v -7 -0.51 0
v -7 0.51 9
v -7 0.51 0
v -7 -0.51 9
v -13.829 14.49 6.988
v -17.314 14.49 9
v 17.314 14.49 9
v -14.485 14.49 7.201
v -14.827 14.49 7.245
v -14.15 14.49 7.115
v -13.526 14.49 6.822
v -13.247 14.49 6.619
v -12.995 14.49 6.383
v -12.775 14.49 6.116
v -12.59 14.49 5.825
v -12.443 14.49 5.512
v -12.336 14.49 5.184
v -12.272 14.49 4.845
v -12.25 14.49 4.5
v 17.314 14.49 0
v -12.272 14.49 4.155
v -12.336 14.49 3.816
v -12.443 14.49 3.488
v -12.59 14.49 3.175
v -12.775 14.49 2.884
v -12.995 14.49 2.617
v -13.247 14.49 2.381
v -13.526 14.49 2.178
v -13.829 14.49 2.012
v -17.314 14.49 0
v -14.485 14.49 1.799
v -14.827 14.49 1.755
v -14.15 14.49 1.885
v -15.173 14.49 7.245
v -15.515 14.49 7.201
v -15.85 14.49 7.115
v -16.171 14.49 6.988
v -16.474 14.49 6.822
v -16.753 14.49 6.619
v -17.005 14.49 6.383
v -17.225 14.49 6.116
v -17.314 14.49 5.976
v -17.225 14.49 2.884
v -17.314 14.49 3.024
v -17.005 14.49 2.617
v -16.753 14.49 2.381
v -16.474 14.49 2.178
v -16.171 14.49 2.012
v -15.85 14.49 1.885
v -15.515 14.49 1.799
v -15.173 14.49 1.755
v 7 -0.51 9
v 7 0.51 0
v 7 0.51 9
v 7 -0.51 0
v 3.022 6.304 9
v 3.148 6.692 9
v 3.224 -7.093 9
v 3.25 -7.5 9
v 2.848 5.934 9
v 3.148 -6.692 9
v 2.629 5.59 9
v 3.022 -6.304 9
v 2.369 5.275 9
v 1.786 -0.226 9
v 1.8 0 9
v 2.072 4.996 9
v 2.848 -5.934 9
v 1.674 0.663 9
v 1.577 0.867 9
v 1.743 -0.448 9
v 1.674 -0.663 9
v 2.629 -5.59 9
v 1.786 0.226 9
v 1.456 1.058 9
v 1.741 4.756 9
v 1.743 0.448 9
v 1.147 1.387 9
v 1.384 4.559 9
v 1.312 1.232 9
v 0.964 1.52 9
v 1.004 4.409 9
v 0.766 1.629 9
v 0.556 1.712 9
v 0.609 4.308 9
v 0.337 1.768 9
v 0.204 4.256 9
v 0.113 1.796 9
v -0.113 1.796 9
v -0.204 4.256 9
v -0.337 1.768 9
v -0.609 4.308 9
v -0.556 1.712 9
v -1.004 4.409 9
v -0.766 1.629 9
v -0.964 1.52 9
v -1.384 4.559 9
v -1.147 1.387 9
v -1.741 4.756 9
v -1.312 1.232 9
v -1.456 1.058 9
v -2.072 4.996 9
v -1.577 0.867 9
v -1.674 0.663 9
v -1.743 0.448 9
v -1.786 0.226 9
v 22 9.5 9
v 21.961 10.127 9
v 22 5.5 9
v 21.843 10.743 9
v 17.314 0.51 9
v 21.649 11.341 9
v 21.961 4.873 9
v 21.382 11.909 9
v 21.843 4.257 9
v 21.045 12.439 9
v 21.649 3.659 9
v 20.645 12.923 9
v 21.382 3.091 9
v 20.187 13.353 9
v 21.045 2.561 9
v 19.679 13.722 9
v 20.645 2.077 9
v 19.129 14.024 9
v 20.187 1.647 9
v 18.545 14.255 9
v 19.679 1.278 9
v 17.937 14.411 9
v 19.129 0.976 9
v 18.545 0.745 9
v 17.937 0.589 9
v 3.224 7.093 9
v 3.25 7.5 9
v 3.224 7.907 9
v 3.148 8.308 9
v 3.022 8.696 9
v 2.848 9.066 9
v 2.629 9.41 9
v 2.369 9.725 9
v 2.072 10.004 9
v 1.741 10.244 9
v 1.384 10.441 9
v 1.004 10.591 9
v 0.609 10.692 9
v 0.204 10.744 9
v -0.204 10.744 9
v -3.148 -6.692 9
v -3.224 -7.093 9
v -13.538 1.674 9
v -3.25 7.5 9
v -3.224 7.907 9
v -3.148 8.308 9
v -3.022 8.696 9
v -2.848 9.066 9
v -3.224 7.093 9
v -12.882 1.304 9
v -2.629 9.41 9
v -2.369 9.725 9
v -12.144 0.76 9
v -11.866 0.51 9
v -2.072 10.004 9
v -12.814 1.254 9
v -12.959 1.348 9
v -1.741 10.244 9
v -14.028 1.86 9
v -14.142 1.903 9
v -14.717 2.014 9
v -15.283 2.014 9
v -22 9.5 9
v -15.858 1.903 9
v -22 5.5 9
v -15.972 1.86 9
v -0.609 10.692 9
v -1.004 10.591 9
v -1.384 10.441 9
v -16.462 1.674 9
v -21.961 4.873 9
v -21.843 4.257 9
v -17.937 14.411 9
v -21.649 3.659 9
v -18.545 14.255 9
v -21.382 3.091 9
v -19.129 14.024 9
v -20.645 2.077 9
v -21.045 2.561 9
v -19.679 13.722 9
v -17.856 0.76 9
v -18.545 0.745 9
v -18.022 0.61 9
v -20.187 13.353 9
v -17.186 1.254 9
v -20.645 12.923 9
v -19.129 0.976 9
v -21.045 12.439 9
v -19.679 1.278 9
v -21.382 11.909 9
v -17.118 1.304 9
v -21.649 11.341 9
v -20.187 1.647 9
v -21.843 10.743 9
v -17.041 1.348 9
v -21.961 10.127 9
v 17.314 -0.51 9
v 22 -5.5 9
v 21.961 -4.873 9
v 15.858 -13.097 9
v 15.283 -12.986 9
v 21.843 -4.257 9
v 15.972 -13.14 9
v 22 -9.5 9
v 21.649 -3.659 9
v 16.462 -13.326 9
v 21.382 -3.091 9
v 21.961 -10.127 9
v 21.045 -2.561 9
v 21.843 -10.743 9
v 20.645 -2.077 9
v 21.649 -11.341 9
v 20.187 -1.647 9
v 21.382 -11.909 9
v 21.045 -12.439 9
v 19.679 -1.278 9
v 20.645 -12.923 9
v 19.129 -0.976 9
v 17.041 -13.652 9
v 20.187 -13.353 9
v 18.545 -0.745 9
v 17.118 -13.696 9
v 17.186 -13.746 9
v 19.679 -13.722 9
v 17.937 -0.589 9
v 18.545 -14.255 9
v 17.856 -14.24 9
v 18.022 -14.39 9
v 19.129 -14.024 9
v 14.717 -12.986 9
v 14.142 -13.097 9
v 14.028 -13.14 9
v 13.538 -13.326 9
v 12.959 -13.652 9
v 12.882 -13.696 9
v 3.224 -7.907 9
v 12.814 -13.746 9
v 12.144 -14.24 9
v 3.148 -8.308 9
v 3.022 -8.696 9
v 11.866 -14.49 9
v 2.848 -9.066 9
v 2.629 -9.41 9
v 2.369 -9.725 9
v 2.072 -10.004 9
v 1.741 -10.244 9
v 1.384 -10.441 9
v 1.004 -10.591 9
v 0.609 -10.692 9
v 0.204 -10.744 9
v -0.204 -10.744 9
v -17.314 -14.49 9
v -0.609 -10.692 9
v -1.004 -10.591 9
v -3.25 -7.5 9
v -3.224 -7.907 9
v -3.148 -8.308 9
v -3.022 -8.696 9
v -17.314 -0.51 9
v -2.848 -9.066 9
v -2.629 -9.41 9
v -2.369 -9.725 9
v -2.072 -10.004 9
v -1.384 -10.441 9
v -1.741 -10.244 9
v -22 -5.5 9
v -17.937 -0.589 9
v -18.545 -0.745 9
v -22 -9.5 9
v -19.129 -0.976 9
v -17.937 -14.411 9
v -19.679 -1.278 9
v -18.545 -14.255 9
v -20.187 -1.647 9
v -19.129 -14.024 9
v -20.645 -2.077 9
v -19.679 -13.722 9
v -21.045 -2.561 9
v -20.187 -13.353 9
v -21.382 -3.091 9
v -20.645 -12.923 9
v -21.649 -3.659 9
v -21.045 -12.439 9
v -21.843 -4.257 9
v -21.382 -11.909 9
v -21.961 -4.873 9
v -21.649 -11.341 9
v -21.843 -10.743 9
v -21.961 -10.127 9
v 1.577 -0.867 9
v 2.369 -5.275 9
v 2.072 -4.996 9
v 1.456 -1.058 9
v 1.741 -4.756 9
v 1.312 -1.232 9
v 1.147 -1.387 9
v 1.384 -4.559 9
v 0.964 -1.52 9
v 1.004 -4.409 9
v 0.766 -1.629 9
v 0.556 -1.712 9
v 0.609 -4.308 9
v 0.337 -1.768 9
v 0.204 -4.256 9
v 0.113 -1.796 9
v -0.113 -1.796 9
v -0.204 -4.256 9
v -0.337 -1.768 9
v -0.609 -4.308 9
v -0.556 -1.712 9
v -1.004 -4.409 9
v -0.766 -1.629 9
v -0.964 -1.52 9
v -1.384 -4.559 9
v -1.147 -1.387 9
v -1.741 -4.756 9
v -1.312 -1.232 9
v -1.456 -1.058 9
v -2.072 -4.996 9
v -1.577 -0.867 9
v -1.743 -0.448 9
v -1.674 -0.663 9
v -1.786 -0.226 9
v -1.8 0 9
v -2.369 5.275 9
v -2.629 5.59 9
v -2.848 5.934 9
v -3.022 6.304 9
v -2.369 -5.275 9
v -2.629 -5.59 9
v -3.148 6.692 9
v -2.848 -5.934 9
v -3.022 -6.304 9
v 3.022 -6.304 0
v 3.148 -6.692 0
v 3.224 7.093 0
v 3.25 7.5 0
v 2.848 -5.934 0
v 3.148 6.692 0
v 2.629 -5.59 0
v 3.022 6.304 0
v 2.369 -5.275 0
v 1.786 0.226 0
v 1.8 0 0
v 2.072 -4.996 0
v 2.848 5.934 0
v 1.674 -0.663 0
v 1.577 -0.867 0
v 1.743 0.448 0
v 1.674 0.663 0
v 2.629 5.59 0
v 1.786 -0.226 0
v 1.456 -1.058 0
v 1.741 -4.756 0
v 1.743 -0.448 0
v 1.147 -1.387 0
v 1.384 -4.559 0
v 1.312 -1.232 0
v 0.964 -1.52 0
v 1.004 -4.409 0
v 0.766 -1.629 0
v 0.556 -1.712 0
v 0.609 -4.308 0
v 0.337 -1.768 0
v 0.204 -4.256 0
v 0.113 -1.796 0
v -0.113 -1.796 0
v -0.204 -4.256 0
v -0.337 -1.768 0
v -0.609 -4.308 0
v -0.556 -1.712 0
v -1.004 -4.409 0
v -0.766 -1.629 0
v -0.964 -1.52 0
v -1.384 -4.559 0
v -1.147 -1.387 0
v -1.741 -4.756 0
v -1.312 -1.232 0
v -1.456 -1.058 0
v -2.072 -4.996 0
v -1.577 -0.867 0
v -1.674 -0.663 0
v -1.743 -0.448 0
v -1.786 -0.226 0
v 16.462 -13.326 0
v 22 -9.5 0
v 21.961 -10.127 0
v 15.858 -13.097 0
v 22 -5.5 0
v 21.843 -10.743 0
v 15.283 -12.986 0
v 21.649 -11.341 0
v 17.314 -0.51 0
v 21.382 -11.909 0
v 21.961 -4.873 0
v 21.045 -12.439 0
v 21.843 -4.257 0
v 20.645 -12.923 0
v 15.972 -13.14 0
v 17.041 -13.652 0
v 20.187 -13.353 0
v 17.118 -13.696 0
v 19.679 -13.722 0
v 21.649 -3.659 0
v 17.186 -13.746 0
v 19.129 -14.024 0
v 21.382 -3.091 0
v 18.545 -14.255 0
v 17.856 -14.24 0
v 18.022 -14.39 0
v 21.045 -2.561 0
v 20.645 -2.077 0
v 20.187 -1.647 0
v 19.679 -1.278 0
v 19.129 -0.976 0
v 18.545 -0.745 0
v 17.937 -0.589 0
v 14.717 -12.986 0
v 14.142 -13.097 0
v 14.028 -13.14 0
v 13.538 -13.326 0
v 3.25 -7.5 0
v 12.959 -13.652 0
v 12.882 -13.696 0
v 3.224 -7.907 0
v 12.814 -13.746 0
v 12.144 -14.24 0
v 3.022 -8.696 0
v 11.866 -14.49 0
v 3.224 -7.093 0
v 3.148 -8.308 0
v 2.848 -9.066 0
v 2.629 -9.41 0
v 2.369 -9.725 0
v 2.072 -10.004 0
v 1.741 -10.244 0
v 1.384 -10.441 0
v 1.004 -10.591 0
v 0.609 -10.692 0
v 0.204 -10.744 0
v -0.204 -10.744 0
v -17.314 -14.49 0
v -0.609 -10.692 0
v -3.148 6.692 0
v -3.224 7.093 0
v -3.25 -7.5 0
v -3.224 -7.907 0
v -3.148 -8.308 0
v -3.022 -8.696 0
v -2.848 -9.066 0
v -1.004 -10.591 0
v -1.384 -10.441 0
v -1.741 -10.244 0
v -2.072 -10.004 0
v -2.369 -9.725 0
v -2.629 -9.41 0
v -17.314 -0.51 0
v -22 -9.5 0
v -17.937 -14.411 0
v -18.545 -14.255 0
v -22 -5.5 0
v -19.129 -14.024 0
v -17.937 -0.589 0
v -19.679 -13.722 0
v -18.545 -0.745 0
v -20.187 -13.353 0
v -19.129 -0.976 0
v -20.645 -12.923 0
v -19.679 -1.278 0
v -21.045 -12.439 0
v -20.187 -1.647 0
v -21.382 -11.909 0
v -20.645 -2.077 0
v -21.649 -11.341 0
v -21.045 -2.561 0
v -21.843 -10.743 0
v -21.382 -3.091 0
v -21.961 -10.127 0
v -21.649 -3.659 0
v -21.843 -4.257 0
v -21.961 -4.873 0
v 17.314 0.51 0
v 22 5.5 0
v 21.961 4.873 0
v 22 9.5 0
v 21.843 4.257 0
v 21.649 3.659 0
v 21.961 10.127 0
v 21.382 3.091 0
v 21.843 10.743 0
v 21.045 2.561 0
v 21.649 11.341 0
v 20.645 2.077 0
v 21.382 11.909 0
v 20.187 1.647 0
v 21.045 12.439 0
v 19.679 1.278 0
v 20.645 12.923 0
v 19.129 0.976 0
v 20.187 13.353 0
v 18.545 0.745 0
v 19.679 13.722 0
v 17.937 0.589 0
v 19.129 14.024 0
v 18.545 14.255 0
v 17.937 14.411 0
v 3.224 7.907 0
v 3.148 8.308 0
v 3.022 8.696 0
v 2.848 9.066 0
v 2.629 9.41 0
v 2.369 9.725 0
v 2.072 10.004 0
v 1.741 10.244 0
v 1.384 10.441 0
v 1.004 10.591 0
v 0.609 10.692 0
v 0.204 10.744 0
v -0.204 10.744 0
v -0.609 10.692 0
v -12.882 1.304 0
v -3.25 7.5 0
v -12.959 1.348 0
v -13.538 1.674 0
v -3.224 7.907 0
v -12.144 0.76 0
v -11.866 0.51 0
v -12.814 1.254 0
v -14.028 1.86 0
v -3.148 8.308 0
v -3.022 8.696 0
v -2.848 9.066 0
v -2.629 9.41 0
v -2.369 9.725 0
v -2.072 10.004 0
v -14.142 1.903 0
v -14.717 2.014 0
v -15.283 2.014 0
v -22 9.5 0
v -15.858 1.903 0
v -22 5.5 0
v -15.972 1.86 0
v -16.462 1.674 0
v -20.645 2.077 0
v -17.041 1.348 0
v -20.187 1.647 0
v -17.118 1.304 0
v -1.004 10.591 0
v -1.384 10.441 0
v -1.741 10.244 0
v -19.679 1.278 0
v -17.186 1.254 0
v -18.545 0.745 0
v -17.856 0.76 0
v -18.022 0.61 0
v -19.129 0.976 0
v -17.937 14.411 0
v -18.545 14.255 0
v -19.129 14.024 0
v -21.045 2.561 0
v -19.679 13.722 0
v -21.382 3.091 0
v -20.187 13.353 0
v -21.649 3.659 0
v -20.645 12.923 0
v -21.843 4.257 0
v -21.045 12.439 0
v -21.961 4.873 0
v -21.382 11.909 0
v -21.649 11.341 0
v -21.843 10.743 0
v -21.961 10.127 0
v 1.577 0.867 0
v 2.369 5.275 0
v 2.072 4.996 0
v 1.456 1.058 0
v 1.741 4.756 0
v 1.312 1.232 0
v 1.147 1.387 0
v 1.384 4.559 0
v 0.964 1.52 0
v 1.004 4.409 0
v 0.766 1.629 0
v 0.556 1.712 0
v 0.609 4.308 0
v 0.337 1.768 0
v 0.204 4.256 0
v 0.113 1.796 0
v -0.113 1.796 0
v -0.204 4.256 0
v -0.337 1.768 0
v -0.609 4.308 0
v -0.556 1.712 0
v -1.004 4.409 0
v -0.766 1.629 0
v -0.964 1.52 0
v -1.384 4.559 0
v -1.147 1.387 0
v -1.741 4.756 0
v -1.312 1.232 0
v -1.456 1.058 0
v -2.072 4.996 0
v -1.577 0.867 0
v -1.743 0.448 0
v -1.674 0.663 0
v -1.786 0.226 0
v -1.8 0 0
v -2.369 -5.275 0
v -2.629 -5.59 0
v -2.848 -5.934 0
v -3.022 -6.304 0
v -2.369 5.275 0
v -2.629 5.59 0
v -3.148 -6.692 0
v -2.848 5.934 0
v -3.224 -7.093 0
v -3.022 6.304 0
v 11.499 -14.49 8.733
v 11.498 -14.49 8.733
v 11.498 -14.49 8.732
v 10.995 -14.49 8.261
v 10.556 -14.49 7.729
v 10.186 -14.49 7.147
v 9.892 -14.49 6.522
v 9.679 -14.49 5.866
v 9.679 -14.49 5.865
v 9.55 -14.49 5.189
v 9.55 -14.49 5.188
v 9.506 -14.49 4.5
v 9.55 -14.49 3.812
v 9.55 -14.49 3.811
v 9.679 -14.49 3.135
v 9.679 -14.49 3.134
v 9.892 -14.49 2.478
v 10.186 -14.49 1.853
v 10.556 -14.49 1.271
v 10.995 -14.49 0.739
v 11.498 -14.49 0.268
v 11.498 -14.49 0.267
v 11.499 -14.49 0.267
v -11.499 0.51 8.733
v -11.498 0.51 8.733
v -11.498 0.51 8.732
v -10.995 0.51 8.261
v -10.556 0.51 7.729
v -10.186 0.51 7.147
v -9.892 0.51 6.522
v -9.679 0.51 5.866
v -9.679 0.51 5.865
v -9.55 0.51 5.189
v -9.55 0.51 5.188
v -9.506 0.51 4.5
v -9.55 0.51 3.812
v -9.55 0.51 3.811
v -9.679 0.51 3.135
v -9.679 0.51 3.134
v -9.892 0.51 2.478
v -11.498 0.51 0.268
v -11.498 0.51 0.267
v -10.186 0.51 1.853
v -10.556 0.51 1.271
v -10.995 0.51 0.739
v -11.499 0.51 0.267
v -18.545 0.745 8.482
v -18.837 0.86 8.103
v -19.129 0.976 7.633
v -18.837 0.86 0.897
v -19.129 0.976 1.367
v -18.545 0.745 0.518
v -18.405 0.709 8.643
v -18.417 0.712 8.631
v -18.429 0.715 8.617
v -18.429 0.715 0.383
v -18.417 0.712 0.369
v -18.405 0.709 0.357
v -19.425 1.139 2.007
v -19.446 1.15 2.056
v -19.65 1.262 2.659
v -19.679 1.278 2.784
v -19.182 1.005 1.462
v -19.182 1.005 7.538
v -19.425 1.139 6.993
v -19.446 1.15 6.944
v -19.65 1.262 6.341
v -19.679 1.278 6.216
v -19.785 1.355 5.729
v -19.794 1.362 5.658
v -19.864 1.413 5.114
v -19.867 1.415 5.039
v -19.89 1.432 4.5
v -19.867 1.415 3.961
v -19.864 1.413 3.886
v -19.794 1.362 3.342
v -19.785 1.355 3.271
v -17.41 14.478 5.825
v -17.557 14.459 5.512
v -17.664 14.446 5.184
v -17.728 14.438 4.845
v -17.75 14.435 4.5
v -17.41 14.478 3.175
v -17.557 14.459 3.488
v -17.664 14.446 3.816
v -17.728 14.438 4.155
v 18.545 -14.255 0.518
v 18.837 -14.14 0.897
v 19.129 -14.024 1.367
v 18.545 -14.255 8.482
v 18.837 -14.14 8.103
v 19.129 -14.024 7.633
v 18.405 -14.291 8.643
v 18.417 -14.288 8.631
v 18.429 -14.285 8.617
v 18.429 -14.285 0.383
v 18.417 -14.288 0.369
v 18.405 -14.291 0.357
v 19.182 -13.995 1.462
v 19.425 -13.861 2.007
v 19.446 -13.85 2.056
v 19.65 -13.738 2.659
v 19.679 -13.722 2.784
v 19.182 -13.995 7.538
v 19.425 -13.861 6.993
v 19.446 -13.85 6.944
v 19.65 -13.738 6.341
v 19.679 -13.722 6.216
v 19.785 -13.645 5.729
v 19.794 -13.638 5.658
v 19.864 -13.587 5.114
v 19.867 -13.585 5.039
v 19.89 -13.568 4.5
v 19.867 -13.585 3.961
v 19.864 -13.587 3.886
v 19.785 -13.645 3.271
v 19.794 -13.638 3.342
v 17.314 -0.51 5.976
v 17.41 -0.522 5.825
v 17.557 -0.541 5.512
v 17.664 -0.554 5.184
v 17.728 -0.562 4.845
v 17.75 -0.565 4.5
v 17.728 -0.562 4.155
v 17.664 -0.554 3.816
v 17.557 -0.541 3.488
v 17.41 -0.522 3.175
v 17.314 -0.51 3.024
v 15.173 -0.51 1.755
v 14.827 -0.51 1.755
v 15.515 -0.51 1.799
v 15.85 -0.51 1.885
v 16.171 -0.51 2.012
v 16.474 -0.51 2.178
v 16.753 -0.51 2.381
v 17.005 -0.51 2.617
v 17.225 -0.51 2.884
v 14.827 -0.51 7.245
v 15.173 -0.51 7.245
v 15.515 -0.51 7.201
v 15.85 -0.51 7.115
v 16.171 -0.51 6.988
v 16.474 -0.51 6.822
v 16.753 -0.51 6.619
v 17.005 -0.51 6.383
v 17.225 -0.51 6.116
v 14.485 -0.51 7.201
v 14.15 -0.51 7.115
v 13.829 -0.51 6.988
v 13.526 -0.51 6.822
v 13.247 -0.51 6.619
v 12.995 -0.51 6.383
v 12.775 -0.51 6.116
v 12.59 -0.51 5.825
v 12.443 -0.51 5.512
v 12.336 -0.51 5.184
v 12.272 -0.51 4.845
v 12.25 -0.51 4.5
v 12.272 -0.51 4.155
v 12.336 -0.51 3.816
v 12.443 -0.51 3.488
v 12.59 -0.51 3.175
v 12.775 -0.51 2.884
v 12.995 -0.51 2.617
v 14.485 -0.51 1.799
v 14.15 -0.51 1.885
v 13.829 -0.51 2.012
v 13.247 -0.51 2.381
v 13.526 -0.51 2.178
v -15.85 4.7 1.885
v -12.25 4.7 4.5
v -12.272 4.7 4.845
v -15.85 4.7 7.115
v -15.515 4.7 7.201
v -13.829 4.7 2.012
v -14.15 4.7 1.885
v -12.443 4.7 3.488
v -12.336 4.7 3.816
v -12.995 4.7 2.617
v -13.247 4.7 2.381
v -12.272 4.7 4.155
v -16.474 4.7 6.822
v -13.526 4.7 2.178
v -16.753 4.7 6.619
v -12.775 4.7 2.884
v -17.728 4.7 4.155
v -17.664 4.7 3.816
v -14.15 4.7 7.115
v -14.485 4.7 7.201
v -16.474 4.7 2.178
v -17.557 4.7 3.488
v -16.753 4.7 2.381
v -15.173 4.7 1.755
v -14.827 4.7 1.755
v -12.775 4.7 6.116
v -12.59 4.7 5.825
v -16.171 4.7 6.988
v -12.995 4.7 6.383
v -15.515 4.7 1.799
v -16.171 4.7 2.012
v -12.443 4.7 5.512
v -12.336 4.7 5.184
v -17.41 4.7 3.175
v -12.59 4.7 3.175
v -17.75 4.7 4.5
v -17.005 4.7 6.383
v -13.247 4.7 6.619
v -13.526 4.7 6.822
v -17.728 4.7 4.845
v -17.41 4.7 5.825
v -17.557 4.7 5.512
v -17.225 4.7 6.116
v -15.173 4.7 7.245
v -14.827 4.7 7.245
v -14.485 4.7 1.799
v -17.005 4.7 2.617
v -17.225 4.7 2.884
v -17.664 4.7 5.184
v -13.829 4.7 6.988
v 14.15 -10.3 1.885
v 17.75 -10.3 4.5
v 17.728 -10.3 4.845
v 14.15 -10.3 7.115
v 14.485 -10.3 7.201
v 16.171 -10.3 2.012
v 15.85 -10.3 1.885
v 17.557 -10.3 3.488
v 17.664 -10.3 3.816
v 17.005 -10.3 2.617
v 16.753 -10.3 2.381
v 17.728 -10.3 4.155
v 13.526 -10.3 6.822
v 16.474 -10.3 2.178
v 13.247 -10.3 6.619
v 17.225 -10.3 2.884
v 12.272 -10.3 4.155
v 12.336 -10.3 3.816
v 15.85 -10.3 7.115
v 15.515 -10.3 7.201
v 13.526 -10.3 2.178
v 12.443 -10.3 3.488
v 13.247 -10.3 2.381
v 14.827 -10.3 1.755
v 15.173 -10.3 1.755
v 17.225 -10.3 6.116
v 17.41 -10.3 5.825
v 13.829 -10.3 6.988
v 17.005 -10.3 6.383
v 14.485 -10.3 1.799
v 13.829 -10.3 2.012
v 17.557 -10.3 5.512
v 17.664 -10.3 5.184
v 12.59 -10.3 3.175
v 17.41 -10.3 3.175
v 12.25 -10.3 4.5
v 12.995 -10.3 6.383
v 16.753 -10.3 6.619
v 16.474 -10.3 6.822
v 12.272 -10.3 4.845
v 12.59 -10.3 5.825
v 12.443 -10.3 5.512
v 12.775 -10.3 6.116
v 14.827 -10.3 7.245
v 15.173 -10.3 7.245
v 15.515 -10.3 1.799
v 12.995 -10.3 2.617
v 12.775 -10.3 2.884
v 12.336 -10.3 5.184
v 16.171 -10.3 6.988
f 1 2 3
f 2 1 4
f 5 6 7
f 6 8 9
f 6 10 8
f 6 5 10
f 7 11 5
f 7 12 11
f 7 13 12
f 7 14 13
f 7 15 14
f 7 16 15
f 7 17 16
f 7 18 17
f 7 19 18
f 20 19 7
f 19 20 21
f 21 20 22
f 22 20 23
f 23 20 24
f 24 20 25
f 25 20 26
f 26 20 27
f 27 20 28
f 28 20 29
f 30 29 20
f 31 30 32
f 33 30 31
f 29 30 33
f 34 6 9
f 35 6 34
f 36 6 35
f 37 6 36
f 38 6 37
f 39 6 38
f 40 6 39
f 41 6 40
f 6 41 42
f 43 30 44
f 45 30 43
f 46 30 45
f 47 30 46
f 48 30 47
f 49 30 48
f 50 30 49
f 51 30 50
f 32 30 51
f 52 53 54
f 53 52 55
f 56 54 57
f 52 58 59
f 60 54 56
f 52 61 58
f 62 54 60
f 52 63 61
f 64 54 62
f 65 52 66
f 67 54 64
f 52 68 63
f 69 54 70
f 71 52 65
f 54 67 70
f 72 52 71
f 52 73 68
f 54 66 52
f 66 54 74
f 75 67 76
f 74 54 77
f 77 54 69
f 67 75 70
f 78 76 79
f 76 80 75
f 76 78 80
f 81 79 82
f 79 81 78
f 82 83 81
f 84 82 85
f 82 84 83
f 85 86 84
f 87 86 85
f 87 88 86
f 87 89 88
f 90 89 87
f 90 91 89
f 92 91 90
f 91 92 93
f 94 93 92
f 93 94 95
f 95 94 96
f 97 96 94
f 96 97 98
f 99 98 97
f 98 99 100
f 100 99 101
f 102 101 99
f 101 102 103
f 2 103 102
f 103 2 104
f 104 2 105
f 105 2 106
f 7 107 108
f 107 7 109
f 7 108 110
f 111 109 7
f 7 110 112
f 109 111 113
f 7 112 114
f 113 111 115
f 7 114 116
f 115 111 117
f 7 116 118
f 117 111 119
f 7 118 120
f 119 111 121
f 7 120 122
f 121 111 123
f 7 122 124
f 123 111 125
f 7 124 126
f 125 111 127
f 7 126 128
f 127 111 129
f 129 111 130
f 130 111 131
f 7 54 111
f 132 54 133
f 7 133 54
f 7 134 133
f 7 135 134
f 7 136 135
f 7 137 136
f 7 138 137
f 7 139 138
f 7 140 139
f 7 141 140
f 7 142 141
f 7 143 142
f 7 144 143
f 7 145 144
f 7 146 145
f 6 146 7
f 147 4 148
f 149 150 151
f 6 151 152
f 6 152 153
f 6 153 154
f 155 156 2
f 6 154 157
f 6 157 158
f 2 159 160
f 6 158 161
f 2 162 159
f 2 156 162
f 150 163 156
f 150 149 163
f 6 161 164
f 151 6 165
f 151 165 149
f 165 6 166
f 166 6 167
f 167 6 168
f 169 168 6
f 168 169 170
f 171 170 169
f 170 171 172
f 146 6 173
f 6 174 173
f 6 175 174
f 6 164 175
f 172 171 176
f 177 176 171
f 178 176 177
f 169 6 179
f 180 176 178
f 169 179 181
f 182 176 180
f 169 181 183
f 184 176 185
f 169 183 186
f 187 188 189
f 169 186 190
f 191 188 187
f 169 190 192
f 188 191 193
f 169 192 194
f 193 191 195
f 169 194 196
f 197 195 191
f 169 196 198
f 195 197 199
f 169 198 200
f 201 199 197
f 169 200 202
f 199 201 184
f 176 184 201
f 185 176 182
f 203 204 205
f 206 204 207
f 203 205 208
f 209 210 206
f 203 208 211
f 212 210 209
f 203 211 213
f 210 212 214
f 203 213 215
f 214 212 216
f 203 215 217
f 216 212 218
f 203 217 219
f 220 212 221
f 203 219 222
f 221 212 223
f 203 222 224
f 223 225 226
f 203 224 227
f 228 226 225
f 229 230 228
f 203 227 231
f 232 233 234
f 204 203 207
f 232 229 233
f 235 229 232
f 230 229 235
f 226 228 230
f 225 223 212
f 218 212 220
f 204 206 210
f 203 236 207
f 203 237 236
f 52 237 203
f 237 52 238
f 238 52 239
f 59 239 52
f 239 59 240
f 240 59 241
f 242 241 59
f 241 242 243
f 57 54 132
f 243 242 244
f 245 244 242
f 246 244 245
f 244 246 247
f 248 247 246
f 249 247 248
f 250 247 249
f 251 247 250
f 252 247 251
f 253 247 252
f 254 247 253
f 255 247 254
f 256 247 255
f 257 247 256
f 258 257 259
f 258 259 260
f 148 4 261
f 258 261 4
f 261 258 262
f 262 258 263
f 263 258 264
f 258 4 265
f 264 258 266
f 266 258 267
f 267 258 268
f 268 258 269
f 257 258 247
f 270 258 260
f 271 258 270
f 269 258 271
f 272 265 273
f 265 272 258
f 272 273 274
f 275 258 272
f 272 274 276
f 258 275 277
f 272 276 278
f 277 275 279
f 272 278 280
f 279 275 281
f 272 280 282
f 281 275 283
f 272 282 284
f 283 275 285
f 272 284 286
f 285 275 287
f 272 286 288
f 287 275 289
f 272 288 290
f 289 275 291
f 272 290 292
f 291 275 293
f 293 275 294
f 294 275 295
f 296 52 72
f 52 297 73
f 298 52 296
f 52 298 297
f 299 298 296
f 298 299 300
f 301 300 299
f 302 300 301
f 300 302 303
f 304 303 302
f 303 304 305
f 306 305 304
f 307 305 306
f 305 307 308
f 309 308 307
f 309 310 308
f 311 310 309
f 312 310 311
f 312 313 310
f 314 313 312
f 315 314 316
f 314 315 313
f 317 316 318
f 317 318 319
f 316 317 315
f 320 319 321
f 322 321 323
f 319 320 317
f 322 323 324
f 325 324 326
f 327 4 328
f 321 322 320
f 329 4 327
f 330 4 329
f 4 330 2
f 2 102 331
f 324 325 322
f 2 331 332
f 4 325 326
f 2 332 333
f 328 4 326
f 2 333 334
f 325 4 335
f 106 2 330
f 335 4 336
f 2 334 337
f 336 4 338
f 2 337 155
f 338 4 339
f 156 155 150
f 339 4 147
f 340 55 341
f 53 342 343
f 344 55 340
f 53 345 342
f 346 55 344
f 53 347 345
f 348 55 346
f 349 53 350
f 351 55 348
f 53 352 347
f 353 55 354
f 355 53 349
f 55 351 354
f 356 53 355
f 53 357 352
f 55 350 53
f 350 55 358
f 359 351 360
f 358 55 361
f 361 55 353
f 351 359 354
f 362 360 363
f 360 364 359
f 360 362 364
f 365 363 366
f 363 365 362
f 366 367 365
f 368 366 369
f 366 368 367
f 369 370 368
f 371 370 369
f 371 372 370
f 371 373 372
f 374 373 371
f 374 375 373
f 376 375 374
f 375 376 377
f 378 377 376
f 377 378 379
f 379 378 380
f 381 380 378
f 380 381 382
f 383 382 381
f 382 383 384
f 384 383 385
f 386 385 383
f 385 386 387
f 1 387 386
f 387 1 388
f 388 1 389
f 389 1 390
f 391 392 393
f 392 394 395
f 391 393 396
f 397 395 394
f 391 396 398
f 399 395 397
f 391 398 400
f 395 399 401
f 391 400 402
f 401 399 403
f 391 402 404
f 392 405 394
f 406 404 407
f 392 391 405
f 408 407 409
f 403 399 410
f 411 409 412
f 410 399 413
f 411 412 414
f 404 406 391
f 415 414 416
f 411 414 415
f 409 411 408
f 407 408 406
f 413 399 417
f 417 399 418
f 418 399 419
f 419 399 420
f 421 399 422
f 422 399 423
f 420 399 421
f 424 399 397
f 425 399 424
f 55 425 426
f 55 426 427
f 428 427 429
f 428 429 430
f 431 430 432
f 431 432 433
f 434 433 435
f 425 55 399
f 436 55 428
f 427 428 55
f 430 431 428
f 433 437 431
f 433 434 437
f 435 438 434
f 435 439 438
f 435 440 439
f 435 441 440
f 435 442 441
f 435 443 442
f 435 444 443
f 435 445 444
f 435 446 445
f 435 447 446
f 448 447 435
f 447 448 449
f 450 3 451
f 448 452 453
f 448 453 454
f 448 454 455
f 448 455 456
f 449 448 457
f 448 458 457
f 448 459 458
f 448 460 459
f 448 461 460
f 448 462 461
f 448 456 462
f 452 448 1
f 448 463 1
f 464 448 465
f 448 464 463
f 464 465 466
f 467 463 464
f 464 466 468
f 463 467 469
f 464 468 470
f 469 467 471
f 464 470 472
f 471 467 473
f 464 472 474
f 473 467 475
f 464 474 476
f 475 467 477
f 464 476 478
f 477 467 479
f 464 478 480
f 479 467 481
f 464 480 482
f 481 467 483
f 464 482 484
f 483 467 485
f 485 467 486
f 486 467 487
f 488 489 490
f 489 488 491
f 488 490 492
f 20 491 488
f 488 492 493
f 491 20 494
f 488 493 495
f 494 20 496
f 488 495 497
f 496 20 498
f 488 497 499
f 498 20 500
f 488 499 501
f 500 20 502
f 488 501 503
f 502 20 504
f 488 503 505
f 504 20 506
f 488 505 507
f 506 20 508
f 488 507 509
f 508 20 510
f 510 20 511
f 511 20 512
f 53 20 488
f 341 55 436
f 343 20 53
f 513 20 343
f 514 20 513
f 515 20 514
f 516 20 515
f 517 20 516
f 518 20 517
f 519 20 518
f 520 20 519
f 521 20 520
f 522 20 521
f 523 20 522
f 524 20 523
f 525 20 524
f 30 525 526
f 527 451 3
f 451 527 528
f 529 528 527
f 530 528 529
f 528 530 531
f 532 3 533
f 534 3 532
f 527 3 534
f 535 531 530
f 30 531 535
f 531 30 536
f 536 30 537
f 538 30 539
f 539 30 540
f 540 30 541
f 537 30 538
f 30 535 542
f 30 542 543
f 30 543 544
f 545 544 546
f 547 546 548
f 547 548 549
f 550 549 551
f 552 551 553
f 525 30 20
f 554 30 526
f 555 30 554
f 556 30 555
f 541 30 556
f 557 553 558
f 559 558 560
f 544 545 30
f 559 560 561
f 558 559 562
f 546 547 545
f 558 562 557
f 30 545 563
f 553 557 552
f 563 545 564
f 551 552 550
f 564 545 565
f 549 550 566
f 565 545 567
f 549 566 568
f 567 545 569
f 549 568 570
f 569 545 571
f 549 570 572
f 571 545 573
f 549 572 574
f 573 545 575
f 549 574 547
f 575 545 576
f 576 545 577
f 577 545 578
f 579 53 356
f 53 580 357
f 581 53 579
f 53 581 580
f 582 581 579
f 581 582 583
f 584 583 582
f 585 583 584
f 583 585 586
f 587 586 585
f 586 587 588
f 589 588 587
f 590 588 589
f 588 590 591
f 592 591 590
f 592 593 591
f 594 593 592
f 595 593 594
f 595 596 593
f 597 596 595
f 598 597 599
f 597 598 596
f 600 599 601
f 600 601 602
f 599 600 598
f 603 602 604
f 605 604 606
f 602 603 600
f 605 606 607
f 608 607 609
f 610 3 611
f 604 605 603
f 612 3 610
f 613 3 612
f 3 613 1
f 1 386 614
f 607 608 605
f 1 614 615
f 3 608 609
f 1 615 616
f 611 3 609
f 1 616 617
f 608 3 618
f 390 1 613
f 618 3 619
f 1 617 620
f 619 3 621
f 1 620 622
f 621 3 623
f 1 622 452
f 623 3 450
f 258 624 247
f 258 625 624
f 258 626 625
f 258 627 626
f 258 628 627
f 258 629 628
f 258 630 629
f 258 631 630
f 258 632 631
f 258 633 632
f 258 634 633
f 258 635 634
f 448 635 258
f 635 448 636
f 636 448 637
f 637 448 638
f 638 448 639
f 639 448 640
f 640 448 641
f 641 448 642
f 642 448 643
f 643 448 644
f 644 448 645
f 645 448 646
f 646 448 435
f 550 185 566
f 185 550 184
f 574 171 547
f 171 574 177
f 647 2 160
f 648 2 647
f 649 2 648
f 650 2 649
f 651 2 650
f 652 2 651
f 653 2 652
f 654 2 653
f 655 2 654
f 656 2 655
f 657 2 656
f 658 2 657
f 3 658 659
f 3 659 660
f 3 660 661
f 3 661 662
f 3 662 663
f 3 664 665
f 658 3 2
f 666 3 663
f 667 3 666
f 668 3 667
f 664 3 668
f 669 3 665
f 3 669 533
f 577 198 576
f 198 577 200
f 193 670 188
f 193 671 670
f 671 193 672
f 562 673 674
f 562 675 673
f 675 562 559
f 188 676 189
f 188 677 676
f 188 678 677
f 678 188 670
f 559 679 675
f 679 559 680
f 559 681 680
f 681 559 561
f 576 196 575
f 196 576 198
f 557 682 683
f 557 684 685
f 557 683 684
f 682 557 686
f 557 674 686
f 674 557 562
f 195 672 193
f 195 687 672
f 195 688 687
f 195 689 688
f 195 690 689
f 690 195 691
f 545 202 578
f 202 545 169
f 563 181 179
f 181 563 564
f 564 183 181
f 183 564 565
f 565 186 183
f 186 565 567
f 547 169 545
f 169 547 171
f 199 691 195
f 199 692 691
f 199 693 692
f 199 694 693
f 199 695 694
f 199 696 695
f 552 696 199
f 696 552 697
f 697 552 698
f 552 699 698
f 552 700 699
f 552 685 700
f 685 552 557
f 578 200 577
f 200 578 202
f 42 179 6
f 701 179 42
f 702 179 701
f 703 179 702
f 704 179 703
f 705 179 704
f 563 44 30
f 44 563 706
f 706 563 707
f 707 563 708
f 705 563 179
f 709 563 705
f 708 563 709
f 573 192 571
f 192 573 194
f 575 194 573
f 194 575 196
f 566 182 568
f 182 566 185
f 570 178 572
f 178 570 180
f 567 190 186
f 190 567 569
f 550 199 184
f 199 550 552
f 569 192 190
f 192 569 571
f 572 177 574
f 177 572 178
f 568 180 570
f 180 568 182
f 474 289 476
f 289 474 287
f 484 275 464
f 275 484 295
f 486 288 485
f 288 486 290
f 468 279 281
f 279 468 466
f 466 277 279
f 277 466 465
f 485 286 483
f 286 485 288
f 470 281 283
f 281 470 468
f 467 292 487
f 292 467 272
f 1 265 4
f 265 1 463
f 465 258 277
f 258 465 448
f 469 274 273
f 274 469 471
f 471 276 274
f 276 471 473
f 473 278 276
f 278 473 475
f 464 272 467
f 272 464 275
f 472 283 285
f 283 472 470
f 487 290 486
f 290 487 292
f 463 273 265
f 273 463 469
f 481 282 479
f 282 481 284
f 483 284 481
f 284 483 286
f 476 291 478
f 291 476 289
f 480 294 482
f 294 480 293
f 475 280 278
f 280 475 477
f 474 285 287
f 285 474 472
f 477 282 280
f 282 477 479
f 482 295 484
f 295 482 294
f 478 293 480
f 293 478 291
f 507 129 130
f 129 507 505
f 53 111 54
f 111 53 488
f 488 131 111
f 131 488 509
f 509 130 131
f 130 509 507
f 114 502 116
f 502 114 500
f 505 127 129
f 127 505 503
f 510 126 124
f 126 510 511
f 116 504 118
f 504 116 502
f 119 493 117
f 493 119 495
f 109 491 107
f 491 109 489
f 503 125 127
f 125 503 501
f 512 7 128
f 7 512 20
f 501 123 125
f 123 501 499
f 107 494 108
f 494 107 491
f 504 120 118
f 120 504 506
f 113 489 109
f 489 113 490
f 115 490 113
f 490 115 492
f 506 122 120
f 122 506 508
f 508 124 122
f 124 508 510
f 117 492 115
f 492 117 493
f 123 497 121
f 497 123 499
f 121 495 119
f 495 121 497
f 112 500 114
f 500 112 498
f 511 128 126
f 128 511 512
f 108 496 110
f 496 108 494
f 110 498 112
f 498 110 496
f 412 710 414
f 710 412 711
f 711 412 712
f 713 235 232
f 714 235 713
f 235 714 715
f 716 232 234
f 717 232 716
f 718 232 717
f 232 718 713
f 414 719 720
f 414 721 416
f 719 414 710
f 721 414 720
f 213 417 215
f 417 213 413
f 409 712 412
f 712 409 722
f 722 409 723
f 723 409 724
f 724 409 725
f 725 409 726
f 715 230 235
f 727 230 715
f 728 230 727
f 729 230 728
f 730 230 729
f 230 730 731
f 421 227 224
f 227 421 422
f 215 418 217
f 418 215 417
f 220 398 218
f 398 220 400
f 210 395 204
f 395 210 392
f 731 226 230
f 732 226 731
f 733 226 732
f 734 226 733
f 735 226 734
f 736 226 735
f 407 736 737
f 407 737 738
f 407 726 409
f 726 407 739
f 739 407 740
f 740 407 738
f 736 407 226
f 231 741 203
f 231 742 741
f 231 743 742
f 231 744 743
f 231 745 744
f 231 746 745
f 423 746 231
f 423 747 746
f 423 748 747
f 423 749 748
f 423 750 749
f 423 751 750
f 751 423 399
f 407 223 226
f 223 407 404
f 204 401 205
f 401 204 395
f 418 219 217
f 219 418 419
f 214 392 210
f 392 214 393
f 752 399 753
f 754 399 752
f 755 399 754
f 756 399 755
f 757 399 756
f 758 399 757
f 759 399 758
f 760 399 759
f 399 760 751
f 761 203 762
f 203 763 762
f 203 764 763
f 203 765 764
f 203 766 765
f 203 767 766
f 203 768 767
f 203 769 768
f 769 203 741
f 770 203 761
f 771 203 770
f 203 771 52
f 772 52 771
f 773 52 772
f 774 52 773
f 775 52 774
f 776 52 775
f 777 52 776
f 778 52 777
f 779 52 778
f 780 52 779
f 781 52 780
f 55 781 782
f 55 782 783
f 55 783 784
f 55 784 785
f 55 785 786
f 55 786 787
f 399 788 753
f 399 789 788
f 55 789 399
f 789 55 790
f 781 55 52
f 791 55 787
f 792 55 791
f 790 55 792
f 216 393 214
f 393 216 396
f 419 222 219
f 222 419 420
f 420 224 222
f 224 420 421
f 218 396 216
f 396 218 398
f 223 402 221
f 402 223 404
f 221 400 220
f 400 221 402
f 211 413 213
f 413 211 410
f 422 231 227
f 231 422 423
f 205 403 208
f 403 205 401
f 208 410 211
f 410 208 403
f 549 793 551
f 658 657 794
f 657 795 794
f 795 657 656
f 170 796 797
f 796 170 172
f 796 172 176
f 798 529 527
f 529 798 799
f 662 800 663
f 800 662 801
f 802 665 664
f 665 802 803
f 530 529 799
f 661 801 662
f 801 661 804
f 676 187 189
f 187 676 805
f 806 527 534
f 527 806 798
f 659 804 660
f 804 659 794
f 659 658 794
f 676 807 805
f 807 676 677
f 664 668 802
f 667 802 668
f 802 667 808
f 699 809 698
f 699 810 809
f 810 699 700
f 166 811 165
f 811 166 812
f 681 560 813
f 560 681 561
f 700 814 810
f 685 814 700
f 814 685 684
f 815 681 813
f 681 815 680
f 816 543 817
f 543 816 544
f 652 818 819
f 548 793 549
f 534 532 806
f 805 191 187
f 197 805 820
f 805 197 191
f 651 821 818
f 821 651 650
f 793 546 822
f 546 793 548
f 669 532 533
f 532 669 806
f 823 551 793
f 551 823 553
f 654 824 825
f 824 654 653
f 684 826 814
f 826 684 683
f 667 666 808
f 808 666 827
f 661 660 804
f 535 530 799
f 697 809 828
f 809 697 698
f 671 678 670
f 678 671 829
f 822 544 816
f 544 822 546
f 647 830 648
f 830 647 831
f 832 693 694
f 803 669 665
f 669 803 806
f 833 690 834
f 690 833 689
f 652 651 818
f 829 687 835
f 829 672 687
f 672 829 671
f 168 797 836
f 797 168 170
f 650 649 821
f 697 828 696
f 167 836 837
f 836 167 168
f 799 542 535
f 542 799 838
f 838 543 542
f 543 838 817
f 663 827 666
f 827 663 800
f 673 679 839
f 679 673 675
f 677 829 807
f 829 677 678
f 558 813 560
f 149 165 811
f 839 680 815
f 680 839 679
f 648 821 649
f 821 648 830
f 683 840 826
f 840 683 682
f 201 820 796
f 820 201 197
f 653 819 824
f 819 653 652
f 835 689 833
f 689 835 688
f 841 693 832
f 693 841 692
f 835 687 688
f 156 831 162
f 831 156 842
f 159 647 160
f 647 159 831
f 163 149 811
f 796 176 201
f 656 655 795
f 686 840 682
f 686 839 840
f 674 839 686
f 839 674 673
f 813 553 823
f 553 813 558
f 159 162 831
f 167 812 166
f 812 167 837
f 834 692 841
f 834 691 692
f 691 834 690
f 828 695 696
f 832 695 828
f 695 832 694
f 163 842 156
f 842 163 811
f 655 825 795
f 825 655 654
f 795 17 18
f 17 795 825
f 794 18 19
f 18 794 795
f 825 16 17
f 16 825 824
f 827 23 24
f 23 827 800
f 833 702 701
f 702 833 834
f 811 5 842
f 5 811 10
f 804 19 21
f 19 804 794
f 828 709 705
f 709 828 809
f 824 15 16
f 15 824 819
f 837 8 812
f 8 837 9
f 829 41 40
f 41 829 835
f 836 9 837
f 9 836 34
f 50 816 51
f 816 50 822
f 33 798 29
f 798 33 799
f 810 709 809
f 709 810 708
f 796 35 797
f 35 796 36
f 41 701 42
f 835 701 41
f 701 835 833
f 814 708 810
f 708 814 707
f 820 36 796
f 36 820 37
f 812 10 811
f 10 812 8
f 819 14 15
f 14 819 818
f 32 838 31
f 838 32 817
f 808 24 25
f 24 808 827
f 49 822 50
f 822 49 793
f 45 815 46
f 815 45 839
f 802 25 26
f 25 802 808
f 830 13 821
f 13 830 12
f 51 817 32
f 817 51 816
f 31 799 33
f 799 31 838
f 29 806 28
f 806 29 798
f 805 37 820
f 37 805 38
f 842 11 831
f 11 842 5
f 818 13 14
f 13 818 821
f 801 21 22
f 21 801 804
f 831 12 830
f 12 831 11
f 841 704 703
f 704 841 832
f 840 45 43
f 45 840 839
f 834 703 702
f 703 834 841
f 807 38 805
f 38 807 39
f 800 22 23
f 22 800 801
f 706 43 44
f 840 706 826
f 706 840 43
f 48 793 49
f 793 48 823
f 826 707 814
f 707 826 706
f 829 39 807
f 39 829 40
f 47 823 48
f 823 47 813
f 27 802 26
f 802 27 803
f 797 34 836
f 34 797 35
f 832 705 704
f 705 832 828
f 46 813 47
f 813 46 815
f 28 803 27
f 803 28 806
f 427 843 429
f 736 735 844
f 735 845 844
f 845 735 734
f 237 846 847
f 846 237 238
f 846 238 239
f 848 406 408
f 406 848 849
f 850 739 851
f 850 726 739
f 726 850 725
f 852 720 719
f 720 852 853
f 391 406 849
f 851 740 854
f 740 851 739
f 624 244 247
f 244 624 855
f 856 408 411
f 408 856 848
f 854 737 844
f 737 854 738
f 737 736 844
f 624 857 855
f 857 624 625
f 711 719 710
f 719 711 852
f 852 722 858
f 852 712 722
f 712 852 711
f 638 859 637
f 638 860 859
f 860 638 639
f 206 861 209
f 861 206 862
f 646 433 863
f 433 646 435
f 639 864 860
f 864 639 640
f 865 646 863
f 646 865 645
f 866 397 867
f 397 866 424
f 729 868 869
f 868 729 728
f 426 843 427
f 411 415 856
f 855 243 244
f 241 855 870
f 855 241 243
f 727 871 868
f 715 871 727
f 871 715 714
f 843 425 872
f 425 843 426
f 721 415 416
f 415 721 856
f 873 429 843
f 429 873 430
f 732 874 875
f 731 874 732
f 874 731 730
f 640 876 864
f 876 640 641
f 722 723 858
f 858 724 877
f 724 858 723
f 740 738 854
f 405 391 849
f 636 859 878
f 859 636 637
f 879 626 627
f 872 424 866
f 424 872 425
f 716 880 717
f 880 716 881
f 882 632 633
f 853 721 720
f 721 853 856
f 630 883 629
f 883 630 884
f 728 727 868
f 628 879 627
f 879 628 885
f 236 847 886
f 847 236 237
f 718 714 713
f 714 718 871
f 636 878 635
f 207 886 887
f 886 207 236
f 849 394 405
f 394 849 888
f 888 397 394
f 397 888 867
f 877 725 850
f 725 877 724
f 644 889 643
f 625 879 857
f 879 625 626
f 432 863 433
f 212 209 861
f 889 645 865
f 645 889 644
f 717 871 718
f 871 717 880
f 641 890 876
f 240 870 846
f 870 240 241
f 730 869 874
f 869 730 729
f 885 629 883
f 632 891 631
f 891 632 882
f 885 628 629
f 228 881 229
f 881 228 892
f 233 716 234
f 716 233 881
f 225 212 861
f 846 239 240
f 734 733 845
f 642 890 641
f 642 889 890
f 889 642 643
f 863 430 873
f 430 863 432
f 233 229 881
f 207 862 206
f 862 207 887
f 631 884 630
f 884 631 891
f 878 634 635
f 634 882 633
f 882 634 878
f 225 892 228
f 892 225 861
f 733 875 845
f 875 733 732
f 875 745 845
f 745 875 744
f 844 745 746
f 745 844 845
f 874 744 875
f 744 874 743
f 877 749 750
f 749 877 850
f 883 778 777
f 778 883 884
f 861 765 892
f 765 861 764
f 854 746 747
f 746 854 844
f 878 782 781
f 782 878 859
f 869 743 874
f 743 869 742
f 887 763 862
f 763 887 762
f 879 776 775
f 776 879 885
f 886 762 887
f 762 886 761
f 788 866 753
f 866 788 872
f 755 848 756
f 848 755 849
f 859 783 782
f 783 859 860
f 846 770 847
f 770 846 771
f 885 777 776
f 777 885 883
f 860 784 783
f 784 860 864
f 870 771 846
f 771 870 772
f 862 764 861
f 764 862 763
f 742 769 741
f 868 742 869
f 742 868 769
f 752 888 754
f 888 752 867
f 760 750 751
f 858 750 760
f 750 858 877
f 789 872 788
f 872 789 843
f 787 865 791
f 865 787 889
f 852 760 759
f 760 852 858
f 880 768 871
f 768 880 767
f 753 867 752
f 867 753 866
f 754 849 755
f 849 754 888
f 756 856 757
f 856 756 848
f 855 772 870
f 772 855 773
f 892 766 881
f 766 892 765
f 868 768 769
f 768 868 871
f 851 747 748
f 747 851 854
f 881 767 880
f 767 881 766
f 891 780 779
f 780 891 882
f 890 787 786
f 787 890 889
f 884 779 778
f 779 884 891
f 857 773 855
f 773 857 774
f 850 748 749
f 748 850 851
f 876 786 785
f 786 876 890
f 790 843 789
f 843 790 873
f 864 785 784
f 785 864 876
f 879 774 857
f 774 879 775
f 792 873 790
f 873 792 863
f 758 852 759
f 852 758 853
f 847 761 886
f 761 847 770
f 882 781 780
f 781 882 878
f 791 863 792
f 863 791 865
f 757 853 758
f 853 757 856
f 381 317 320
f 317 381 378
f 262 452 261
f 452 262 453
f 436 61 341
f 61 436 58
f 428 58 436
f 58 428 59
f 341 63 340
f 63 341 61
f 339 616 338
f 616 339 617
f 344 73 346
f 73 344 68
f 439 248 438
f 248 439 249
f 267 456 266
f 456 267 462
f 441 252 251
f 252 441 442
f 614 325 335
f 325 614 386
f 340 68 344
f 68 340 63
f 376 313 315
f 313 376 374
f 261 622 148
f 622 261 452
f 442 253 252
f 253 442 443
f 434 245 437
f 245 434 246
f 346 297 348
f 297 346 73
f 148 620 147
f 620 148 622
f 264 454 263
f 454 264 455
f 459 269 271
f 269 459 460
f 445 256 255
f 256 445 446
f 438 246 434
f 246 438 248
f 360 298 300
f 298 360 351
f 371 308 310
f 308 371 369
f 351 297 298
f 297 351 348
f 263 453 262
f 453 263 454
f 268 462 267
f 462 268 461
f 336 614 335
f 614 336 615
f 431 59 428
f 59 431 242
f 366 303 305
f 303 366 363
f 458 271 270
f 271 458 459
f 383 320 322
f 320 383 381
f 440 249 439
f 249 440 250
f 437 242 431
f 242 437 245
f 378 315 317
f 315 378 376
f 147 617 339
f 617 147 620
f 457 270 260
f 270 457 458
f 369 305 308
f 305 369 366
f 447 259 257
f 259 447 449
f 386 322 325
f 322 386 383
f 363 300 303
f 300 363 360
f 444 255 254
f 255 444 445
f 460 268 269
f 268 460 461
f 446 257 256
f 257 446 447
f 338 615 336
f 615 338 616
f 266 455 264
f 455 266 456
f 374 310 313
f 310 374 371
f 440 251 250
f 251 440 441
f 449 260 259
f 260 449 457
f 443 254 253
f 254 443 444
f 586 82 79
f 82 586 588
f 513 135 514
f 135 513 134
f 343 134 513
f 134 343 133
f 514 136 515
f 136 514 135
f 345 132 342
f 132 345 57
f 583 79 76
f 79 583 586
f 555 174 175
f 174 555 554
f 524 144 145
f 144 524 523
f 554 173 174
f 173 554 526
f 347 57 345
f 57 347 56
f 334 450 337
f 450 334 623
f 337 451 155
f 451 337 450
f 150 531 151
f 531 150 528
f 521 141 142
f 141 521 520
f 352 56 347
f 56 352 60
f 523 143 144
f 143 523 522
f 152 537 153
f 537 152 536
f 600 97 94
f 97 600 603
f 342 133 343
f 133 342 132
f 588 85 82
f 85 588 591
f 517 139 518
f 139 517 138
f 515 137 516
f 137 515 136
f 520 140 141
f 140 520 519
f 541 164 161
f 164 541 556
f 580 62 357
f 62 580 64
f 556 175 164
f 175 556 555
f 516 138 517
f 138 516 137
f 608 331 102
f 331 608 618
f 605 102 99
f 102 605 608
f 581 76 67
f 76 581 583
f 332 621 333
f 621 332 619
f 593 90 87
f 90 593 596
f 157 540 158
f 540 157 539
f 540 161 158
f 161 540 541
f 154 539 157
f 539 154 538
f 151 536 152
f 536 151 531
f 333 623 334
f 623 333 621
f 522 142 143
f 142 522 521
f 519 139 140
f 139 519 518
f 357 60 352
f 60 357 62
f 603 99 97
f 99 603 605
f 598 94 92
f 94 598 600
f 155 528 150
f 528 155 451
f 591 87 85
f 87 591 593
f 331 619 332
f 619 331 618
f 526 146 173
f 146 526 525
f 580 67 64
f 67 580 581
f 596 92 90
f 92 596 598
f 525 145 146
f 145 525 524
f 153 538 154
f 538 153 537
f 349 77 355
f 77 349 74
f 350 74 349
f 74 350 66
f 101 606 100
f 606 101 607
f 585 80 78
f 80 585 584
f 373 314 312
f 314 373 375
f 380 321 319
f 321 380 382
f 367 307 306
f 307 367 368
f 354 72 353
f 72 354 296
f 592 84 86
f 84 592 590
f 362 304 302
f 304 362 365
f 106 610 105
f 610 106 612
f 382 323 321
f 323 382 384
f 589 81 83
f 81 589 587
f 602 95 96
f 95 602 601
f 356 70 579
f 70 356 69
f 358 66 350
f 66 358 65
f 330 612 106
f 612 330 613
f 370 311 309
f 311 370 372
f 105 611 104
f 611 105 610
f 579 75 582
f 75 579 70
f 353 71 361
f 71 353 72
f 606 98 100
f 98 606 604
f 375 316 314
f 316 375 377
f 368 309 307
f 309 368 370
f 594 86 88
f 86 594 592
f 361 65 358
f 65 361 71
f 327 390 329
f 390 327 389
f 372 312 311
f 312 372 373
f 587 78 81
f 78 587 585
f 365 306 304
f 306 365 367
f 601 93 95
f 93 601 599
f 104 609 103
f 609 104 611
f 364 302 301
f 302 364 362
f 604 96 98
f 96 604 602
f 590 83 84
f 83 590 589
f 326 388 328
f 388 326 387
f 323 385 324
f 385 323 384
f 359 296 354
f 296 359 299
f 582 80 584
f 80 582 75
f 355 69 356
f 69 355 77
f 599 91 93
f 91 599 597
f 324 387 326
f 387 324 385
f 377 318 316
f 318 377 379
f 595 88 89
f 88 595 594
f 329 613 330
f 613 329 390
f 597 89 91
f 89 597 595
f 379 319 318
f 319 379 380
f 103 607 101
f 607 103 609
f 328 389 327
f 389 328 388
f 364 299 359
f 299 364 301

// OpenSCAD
$fn = 50;


difference() {
	union() {
		hull() {
			translate(v = [-2.0000000000, 9.5000000000, 0]) {
				cylinder(h = 9, r = 5);
			}
			translate(v = [2.0000000000, 9.5000000000, 0]) {
				cylinder(h = 9, r = 5);
			}
			translate(v = [-2.0000000000, -9.5000000000, 0]) {
				cylinder(h = 9, r = 5);
			}
			translate(v = [2.0000000000, -9.5000000000, 0]) {
				cylinder(h = 9, r = 5);
			}
		}
		translate(v = [-7.5000000000, 7.5000000000, 0]) {
			hull() {
				translate(v = [-9.5000000000, 2.0000000000, 0]) {
					cylinder(h = 9, r = 5);
				}
				translate(v = [9.5000000000, 2.0000000000, 0]) {
					cylinder(h = 9, r = 5);
				}
				translate(v = [-9.5000000000, -2.0000000000, 0]) {
					cylinder(h = 9, r = 5);
				}
				translate(v = [9.5000000000, -2.0000000000, 0]) {
					cylinder(h = 9, r = 5);
				}
			}
		}
		translate(v = [-7.5000000000, -7.5000000000, 0]) {
			hull() {
				translate(v = [-9.5000000000, 2.0000000000, 0]) {
					cylinder(h = 9, r = 5);
				}
				translate(v = [9.5000000000, 2.0000000000, 0]) {
					cylinder(h = 9, r = 5);
				}
				translate(v = [-9.5000000000, -2.0000000000, 0]) {
					cylinder(h = 9, r = 5);
				}
				translate(v = [9.5000000000, -2.0000000000, 0]) {
					cylinder(h = 9, r = 5);
				}
			}
		}
		translate(v = [7.5000000000, 7.5000000000, 0]) {
			hull() {
				translate(v = [-9.5000000000, 2.0000000000, 0]) {
					cylinder(h = 9, r = 5);
				}
				translate(v = [9.5000000000, 2.0000000000, 0]) {
					cylinder(h = 9, r = 5);
				}
				translate(v = [-9.5000000000, -2.0000000000, 0]) {
					cylinder(h = 9, r = 5);
				}
				translate(v = [9.5000000000, -2.0000000000, 0]) {
					cylinder(h = 9, r = 5);
				}
			}
		}
		translate(v = [7.5000000000, -7.5000000000, 0]) {
			hull() {
				translate(v = [-9.5000000000, 2.0000000000, 0]) {
					cylinder(h = 9, r = 5);
				}
				translate(v = [9.5000000000, 2.0000000000, 0]) {
					cylinder(h = 9, r = 5);
				}
				translate(v = [-9.5000000000, -2.0000000000, 0]) {
					cylinder(h = 9, r = 5);
				}
				translate(v = [9.5000000000, -2.0000000000, 0]) {
					cylinder(h = 9, r = 5);
				}
			}
		}
	}
	union() {
		translate(v = [-15.0000000000, 0.5000000000, 4.5000000000]) {
			rotate(a = [90, 0, 0]) {
				difference() {
					union() {
						#translate(v = [0, 0, -14.0000000000]) {
							cylinder(h = 14, r = 2.2500000000);
						}
						#translate(v = [0, 0, -4.2000000000]) {
							cylinder(h = 4.2000000000, r1 = 2.7500000000, r2 = 5.5000000000);
						}
						#translate(v = [0, 0, -14.0000000000]) {
							cylinder(h = 14, r = 2.7500000000);
						}
						#translate(v = [0, 0, -14.0000000000]) {
							cylinder(h = 14, r = 2.2500000000);
						}
					}
					union();
				}
			}
		}
		translate(v = [15.0000000000, -14.5000000000, 4.5000000000]) {
			rotate(a = [90, 0, 0]) {
				difference() {
					union() {
						#translate(v = [0, 0, -14.0000000000]) {
							cylinder(h = 14, r = 2.2500000000);
						}
						#translate(v = [0, 0, -4.2000000000]) {
							cylinder(h = 4.2000000000, r1 = 2.7500000000, r2 = 5.5000000000);
						}
						#translate(v = [0, 0, -14.0000000000]) {
							cylinder(h = 14, r = 2.7500000000);
						}
						#translate(v = [0, 0, -14.0000000000]) {
							cylinder(h = 14, r = 2.2500000000);
						}
					}
					union();
				}
			}
		}
		translate(v = [0.0000000000, -7.5000000000, 0]) {
			translate(v = [0, 0, -100]) {
				cylinder(h = 200, r = 3.2500000000);
			}
		}
		translate(v = [0.0000000000, 7.5000000000, 0]) {
			translate(v = [0, 0, -100]) {
				cylinder(h = 200, r = 3.2500000000);
			}
		}
		translate(v = [0.0000000000, -7.5000000000, 0]) {
			translate(v = [0, 0, -100]) {
				cylinder(h = 200, r = 1.8000000000);
			}
		}
		translate(v = [0, 0, -100]) {
			cylinder(h = 200, r = 1.8000000000);
		}
		translate(v = [0.0000000000, 7.5000000000, 0]) {
			translate(v = [0, 0, -100]) {
				cylinder(h = 200, r = 1.8000000000);
			}
		}
	}
}
